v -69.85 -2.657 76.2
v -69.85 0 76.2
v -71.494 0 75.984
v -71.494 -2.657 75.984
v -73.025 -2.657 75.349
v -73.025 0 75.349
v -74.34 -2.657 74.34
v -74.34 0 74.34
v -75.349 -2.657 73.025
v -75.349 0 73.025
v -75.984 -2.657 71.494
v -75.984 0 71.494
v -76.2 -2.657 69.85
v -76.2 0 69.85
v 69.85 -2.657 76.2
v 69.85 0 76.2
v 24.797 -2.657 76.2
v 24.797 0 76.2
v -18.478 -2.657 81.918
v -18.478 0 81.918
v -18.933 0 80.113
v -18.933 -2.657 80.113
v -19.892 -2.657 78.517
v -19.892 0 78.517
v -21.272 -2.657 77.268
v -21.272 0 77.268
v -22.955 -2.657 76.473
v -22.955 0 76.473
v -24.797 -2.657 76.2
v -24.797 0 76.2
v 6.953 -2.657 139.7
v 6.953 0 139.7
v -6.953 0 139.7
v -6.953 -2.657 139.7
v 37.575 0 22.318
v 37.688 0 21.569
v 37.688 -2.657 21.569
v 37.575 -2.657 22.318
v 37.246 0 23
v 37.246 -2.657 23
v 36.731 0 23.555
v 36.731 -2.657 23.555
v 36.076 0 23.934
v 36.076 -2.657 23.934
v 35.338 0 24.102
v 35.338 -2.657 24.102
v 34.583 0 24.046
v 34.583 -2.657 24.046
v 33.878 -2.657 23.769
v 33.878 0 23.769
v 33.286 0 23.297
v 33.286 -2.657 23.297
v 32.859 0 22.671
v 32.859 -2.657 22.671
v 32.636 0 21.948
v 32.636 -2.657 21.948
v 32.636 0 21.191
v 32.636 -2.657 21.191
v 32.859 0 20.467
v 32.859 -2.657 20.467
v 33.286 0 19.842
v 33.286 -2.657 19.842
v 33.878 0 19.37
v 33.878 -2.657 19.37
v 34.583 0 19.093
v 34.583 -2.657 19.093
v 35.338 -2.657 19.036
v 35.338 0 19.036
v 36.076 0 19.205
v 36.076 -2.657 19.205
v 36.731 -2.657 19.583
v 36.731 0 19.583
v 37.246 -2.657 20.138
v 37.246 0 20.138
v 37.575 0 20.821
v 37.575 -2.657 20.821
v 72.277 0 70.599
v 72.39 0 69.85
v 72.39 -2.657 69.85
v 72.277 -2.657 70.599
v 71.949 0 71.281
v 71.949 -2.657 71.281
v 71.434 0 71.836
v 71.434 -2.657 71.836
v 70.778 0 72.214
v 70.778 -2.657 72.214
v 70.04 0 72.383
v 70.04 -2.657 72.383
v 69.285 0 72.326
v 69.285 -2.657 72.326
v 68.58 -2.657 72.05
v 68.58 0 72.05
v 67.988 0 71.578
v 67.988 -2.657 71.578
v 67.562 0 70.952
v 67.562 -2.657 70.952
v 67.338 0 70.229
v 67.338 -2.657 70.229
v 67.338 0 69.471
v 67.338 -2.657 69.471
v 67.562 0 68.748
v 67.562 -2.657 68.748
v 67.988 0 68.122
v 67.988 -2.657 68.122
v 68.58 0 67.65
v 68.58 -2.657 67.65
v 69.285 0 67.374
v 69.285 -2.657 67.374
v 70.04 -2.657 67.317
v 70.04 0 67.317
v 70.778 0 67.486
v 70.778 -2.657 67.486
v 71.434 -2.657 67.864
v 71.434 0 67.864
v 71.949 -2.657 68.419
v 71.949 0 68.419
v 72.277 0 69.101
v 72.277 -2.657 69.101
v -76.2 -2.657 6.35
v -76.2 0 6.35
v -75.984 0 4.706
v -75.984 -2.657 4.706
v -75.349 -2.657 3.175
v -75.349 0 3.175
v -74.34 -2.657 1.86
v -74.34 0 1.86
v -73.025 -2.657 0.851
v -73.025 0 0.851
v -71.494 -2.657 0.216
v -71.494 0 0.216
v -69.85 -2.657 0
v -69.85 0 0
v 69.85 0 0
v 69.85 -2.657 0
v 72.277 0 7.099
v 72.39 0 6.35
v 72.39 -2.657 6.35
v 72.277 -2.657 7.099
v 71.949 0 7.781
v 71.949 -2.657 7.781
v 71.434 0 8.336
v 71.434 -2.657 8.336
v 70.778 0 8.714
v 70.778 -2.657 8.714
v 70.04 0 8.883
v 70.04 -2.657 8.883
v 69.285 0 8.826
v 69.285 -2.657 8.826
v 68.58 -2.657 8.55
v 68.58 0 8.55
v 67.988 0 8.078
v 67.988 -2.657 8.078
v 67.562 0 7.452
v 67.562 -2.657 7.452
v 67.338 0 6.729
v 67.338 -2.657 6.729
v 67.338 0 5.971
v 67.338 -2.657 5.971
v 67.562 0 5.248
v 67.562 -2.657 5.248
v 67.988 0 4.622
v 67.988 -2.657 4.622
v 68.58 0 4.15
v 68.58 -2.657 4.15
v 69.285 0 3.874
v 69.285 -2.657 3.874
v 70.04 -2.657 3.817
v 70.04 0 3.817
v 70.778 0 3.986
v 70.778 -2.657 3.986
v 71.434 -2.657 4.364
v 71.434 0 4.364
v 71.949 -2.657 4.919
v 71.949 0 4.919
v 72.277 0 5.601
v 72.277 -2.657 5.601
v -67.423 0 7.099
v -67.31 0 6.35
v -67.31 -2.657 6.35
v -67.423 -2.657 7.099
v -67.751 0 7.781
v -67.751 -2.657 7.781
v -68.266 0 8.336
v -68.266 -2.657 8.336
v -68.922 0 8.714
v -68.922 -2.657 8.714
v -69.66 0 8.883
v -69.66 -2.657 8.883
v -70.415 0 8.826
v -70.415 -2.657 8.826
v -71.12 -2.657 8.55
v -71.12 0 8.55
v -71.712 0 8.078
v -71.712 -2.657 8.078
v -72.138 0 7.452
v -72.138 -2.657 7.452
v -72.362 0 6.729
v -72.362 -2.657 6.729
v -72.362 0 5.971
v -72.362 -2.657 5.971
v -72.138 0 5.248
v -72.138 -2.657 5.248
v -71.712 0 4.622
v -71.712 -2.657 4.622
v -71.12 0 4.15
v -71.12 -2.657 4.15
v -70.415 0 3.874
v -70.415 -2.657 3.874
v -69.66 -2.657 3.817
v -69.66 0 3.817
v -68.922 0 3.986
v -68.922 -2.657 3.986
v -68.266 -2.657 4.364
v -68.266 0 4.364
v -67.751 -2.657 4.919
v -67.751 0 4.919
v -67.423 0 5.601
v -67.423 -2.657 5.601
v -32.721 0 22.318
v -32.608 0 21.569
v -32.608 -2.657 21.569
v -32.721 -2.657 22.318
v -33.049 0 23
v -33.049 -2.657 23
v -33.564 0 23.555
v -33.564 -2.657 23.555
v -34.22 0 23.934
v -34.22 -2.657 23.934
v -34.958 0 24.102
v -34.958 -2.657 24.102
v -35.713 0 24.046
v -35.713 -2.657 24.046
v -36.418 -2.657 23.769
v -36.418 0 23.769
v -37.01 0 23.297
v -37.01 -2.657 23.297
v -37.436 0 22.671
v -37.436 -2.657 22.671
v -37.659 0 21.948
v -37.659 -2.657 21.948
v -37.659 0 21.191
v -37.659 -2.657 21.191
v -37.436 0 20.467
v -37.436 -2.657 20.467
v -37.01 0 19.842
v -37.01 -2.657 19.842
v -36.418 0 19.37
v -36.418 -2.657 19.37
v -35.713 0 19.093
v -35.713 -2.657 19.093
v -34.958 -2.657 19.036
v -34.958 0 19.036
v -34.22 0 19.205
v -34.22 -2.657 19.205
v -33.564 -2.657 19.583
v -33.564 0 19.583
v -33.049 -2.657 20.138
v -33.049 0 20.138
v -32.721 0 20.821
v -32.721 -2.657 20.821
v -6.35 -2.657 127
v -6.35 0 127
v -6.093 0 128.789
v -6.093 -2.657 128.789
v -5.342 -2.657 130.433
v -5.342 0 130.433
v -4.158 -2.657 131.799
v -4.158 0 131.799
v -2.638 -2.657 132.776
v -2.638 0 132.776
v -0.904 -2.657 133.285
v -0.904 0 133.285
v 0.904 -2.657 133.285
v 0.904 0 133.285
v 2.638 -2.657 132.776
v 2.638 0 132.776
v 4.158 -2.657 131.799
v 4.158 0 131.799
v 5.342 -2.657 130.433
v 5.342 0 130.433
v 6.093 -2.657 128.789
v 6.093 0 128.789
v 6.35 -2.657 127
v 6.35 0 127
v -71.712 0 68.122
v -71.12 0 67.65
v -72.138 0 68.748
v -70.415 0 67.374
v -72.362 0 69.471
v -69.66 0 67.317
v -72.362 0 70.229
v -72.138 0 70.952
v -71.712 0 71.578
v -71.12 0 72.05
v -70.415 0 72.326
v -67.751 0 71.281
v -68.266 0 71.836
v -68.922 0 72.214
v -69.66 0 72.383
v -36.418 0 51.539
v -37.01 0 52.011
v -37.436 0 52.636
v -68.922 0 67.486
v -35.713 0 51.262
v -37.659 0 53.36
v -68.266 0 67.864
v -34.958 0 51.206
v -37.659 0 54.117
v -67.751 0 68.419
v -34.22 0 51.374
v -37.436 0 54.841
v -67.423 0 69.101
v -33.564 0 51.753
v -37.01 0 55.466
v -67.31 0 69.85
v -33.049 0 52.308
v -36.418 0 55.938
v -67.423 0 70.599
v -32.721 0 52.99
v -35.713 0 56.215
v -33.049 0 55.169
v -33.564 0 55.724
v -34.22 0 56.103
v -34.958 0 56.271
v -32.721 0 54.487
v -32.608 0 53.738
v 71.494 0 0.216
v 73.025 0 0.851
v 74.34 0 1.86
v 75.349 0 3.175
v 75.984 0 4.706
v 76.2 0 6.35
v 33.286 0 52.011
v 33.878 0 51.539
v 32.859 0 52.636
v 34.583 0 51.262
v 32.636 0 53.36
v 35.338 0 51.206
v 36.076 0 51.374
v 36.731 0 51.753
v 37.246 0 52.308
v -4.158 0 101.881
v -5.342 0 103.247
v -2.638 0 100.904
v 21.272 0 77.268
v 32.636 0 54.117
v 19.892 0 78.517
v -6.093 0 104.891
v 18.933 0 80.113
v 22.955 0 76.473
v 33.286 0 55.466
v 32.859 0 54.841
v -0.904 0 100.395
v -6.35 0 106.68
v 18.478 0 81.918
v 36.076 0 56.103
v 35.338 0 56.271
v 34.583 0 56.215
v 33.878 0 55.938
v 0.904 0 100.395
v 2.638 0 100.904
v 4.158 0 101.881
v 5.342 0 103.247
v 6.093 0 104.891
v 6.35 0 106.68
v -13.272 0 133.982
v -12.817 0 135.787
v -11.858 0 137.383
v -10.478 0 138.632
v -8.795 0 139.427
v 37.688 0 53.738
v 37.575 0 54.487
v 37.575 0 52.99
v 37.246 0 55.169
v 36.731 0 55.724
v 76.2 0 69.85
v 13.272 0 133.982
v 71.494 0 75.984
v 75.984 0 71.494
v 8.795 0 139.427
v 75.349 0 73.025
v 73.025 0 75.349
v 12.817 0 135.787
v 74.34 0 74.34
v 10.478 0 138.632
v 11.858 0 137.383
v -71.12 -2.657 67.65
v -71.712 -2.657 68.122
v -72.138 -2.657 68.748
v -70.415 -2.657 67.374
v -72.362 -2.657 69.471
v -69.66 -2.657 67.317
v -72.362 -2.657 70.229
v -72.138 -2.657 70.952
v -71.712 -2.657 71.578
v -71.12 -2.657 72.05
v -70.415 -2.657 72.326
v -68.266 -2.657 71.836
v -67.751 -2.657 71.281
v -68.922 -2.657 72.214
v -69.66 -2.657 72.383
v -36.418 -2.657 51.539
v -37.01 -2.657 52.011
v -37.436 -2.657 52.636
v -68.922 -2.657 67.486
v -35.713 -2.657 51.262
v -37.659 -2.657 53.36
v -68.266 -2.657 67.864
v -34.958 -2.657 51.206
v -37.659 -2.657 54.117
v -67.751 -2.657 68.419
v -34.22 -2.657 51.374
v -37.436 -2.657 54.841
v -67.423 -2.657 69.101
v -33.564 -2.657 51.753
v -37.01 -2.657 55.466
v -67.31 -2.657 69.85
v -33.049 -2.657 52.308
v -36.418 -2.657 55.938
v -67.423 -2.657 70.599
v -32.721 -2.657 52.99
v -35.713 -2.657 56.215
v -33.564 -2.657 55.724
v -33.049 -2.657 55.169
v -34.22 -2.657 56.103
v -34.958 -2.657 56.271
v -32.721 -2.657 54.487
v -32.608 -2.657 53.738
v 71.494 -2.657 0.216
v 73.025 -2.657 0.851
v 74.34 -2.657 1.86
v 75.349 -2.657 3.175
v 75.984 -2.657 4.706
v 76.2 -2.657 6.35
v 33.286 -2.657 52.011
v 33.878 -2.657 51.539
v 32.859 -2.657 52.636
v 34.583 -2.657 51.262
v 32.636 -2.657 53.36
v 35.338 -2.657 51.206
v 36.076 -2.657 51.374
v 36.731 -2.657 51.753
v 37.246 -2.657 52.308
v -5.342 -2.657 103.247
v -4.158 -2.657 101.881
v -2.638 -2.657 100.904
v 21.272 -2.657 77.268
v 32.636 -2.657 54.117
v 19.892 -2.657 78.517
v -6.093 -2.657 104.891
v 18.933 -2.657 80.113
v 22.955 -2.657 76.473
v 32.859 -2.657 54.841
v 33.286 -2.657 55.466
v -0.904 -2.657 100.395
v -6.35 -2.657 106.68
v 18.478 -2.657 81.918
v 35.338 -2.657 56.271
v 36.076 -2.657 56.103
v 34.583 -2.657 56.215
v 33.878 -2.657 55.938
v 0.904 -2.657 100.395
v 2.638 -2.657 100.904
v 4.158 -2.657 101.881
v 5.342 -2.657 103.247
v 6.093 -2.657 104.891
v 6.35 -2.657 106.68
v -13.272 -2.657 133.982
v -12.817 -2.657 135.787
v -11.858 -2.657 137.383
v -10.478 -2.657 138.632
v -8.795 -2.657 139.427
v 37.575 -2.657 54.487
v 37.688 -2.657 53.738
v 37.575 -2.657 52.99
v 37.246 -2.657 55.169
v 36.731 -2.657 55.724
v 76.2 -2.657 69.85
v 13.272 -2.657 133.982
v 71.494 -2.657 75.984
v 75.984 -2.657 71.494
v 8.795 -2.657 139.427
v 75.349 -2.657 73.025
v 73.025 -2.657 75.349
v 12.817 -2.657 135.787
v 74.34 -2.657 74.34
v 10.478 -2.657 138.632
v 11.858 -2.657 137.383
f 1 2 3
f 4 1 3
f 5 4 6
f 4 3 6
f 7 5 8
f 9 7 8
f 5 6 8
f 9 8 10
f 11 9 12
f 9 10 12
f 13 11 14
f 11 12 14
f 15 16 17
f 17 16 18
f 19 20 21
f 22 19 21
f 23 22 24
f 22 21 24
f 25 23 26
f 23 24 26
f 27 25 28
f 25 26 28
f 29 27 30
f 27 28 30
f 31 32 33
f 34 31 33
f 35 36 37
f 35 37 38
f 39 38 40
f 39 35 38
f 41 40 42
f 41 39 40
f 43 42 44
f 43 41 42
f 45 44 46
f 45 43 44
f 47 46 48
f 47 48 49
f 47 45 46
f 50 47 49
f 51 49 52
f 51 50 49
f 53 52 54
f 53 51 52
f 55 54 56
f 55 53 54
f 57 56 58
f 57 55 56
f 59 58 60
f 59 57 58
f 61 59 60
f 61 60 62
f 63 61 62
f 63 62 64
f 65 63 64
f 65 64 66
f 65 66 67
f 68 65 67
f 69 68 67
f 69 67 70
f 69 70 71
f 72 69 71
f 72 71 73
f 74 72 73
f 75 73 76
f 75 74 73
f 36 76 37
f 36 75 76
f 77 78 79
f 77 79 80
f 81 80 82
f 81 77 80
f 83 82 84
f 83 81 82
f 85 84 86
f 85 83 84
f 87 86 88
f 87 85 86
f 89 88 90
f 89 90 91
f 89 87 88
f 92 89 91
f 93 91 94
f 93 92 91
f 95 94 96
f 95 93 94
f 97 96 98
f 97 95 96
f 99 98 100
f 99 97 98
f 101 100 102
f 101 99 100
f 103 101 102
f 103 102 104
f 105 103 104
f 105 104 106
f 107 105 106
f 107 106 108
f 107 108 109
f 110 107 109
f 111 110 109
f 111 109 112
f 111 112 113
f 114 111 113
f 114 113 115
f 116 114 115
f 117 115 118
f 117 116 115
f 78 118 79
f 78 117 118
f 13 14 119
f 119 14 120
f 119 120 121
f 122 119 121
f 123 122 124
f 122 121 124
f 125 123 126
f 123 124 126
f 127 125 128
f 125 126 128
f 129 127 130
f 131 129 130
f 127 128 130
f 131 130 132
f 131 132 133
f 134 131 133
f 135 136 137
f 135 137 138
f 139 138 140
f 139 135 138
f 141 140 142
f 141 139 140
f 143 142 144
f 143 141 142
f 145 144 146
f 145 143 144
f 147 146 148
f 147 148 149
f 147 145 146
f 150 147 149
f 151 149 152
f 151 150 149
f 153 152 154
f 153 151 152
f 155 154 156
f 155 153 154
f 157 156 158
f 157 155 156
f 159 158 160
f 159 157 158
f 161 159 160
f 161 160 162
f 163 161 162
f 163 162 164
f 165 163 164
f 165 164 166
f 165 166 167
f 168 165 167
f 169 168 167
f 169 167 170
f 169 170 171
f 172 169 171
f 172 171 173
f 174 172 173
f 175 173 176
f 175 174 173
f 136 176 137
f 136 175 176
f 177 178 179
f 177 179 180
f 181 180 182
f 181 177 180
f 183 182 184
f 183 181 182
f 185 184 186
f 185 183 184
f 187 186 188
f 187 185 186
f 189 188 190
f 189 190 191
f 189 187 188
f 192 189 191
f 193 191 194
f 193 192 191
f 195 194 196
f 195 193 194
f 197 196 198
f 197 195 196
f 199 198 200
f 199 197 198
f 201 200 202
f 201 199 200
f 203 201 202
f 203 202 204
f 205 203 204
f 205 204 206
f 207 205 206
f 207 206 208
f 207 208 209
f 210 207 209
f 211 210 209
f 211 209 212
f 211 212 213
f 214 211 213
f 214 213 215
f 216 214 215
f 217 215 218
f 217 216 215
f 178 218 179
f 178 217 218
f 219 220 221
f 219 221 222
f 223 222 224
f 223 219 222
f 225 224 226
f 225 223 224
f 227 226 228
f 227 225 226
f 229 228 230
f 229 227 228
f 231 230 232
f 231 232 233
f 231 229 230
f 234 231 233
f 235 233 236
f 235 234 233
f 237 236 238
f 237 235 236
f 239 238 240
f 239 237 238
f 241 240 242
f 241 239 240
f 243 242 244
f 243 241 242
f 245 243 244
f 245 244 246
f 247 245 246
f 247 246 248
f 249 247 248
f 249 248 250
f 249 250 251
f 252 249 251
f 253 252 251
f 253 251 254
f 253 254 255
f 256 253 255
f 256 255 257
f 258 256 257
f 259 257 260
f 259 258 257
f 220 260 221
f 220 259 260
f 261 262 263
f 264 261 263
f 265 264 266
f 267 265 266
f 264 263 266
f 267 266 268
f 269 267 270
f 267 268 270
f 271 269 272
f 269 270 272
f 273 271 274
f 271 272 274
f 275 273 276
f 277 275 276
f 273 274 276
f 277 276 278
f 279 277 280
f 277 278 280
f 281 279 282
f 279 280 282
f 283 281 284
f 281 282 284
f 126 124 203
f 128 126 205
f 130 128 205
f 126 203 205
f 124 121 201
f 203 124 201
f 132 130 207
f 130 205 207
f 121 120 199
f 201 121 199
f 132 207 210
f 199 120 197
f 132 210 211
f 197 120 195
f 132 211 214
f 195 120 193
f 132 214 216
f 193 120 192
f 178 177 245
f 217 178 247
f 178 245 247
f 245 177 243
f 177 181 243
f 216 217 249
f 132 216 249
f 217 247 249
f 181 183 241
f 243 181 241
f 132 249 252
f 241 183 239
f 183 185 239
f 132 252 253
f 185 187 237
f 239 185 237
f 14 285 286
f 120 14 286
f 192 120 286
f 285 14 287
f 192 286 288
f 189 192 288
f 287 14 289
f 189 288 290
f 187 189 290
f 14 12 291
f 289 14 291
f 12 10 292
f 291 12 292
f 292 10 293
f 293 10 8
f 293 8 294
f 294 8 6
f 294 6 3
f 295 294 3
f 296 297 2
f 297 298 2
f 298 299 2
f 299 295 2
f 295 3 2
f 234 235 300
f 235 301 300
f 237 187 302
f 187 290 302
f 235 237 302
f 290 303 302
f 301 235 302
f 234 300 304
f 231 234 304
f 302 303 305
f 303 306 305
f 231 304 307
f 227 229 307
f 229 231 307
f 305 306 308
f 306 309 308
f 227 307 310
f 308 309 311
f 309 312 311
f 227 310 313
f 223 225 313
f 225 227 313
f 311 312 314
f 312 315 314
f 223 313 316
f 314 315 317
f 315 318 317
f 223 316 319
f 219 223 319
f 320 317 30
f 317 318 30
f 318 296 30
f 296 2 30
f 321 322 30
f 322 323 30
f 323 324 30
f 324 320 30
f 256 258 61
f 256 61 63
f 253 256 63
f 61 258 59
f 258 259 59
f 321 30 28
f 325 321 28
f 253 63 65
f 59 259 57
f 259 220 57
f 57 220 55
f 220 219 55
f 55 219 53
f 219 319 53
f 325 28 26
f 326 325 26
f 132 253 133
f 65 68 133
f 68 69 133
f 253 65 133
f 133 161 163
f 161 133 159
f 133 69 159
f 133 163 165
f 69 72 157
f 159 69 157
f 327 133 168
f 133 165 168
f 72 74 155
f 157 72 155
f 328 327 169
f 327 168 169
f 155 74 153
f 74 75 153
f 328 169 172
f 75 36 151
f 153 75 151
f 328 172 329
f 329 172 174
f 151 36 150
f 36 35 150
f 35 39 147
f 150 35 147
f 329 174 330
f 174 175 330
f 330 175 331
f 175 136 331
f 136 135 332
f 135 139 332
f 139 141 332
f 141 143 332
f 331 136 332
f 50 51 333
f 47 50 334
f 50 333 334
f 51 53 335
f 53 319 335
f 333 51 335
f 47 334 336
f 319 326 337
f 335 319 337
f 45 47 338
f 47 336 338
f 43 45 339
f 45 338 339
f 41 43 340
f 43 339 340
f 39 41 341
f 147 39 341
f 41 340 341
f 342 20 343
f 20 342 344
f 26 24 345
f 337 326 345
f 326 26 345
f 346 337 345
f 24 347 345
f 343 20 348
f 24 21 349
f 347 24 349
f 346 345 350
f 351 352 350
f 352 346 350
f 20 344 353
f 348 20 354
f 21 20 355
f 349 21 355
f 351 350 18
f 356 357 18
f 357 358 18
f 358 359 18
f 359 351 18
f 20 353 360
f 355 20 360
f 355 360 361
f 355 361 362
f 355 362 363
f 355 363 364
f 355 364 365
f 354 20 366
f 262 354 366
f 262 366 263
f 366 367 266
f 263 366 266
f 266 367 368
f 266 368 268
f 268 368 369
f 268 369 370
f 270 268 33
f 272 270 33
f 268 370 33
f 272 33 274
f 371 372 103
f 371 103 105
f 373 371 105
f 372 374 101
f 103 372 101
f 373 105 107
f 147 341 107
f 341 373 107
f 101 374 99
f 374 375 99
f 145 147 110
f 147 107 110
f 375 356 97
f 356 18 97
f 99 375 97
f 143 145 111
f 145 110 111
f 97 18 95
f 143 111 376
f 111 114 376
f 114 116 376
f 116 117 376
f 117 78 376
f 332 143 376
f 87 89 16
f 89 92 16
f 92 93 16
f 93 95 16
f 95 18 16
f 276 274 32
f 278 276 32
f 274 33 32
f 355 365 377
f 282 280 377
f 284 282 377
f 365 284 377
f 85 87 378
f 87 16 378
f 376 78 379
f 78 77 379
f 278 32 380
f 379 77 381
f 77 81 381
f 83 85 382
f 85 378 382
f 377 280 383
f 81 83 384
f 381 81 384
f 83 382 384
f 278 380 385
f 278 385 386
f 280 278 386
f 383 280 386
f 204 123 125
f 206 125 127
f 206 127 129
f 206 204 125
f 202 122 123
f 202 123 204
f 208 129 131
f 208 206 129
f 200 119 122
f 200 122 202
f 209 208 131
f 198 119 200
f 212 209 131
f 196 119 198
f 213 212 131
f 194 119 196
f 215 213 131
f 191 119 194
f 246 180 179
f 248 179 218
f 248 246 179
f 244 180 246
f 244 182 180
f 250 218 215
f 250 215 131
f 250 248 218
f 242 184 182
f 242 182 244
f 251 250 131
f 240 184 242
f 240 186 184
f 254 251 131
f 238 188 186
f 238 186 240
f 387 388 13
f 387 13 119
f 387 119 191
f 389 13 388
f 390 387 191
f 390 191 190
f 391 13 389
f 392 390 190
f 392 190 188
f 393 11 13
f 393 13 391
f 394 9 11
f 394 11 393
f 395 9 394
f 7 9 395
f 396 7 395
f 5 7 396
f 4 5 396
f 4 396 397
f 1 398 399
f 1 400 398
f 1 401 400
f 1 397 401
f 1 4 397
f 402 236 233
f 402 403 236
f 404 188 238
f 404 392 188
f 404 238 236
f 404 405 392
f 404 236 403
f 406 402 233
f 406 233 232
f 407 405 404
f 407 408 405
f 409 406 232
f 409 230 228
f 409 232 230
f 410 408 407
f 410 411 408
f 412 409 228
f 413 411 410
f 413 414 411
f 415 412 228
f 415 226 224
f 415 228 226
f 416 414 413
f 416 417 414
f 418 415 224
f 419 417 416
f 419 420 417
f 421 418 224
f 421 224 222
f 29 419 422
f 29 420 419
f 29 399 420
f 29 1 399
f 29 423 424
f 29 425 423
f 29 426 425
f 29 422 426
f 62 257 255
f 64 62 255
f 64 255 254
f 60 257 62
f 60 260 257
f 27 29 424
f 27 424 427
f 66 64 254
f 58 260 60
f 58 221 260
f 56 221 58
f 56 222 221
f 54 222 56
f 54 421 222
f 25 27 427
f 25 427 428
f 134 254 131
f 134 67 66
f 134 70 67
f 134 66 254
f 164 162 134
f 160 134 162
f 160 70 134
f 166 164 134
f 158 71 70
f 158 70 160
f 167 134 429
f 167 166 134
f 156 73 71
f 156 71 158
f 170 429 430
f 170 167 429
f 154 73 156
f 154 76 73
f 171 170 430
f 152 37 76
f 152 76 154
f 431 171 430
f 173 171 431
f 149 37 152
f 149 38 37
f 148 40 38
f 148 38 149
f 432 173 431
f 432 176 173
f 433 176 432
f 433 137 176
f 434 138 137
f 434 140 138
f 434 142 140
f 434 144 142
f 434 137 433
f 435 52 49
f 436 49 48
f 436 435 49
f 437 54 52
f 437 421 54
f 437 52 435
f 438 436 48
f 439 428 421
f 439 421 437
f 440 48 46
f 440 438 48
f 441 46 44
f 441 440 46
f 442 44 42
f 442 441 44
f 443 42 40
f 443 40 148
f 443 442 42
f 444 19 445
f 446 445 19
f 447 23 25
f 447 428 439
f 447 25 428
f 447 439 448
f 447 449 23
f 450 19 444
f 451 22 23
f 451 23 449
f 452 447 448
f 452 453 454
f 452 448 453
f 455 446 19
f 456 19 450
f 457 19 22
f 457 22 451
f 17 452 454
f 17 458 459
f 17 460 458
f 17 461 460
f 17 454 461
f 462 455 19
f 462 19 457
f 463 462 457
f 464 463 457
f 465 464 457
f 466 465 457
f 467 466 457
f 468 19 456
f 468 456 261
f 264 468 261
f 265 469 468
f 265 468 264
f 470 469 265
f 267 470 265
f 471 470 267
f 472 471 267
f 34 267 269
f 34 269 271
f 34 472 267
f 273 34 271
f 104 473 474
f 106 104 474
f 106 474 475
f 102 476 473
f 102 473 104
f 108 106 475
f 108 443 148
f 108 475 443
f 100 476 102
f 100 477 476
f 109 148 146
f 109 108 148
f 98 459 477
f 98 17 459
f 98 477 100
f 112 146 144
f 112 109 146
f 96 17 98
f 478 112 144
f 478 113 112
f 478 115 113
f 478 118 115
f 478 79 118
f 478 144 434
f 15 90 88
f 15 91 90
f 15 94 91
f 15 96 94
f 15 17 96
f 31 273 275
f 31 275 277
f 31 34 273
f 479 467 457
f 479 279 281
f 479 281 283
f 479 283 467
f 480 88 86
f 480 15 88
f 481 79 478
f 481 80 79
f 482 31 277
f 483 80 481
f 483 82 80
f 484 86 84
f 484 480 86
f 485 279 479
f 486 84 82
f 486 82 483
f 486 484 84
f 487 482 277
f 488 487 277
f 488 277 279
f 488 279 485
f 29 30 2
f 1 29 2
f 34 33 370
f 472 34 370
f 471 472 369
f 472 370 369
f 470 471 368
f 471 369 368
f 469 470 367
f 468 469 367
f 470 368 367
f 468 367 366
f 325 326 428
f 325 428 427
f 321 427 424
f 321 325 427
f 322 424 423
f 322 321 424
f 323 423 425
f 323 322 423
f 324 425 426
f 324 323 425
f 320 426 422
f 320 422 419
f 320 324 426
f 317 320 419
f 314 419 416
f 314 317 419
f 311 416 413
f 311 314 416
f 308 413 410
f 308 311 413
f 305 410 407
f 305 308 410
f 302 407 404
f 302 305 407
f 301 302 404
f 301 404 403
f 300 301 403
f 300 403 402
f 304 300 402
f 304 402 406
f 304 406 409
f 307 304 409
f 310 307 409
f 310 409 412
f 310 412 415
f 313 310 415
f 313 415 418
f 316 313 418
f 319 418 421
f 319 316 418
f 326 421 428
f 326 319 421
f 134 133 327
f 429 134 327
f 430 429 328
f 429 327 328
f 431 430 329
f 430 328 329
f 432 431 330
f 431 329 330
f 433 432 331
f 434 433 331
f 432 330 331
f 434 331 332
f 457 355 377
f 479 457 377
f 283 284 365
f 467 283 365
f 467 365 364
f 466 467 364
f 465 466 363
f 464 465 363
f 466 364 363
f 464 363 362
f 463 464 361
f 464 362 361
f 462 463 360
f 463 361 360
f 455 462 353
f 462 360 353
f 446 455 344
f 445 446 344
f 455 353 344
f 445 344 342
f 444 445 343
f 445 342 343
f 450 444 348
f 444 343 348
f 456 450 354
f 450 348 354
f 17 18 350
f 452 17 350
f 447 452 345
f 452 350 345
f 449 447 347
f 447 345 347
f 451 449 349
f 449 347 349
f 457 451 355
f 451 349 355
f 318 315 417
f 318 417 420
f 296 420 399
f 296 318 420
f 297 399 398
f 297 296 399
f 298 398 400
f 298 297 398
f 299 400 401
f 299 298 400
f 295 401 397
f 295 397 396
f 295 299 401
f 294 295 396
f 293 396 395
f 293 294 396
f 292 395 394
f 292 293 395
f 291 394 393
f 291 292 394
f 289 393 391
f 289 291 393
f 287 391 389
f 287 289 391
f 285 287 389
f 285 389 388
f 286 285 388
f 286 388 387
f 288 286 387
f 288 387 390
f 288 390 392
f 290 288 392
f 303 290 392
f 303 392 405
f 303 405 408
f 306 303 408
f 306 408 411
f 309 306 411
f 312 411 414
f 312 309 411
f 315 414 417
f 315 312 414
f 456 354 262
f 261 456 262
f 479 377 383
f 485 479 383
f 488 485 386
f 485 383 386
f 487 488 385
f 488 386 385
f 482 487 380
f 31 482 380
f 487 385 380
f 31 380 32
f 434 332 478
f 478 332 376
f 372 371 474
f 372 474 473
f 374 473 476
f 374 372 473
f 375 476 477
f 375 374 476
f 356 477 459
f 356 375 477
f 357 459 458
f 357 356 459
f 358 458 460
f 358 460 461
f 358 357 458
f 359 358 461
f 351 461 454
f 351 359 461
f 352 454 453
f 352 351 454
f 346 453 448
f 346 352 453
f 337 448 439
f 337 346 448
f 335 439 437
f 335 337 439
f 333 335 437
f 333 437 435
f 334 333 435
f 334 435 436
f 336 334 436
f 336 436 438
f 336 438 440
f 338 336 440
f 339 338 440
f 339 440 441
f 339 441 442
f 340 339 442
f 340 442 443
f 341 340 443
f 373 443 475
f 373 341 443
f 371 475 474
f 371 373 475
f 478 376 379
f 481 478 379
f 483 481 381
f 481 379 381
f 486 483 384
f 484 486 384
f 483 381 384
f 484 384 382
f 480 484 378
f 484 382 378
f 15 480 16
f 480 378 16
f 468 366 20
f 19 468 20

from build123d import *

# Parameters (mm, degrees)
F0_R     = 2.54
F1_DEPTH = 2.65684


with BuildPart() as f1:
    # F0 (on Front) → F1 (new body)
    with BuildSketch(Plane.XZ):
        with BuildLine():
            Line((-69.85, 0), (0, 0))
            Line((0, 0), (69.85, 0))
            ThreePointArc((69.85, 0), (74.340128, 1.859872), (76.2, 6.35))
            Line((76.2, 6.35), (76.2, 69.85))
            ThreePointArc((76.2, 69.85), (74.340128, 74.340128), (69.85, 76.2))
            Line((69.85, 76.2), (24.796671, 76.2))
            ThreePointArc((24.796671, 76.2), (20.535787, 77.841776), (18.478185, 81.918151))
            Line((18.478185, 81.918151), (13.271815, 133.981849))
            ThreePointArc((13.271815, 133.981849), (11.214213, 138.058224), (6.953329, 139.7))
            Line((6.953329, 139.7), (0, 139.7))
            Line((0, 139.7), (-6.953329, 139.7))
            ThreePointArc((-6.953329, 139.7), (-11.214213, 138.058224), (-13.271815, 133.981849))
            Line((-13.271815, 133.981849), (-18.478185, 81.918151))
            ThreePointArc((-18.478185, 81.918151), (-20.535787, 77.841776), (-24.796671, 76.2))
            Line((-24.796671, 76.2), (-69.85, 76.2))
            ThreePointArc((-69.85, 76.2), (-74.340128, 74.340128), (-76.2, 69.85))
            Line((-76.2, 69.85), (-76.2, 6.35))
            ThreePointArc((-76.2, 6.35), (-74.340128, 1.859872), (-69.85, 0))
        make_face()
        with Locations((-69.85, 6.35)):
            Circle(F0_R, mode=Mode.SUBTRACT)
        with Locations((-35.147801, 21.569327)):
            Circle(F0_R, mode=Mode.SUBTRACT)
        with Locations((-35.147801, 53.738443)):
            Circle(F0_R, mode=Mode.SUBTRACT)
        with Locations((35.147801, 21.569327)):
            Circle(F0_R, mode=Mode.SUBTRACT)
        with Locations((69.85, 6.35)):
            Circle(F0_R, mode=Mode.SUBTRACT)
        with Locations((35.147801, 53.738443)):
            Circle(F0_R, mode=Mode.SUBTRACT)
        with Locations((-69.85, 69.85)):
            Circle(F0_R, mode=Mode.SUBTRACT)
        with Locations((69.85, 69.85)):
            Circle(F0_R, mode=Mode.SUBTRACT)
        with BuildLine():
            Line((-6.35, 106.68), (-6.35, 127))
            ThreePointArc((-6.35, 127), (0, 133.35), (6.35, 127))
            Line((6.35, 127), (6.35, 106.68))
            ThreePointArc((6.35, 106.68), (0, 100.33), (-6.35, 106.68))
        make_face(mode=Mode.SUBTRACT)
    extrude(amount=F1_DEPTH)


solid = f1.part
